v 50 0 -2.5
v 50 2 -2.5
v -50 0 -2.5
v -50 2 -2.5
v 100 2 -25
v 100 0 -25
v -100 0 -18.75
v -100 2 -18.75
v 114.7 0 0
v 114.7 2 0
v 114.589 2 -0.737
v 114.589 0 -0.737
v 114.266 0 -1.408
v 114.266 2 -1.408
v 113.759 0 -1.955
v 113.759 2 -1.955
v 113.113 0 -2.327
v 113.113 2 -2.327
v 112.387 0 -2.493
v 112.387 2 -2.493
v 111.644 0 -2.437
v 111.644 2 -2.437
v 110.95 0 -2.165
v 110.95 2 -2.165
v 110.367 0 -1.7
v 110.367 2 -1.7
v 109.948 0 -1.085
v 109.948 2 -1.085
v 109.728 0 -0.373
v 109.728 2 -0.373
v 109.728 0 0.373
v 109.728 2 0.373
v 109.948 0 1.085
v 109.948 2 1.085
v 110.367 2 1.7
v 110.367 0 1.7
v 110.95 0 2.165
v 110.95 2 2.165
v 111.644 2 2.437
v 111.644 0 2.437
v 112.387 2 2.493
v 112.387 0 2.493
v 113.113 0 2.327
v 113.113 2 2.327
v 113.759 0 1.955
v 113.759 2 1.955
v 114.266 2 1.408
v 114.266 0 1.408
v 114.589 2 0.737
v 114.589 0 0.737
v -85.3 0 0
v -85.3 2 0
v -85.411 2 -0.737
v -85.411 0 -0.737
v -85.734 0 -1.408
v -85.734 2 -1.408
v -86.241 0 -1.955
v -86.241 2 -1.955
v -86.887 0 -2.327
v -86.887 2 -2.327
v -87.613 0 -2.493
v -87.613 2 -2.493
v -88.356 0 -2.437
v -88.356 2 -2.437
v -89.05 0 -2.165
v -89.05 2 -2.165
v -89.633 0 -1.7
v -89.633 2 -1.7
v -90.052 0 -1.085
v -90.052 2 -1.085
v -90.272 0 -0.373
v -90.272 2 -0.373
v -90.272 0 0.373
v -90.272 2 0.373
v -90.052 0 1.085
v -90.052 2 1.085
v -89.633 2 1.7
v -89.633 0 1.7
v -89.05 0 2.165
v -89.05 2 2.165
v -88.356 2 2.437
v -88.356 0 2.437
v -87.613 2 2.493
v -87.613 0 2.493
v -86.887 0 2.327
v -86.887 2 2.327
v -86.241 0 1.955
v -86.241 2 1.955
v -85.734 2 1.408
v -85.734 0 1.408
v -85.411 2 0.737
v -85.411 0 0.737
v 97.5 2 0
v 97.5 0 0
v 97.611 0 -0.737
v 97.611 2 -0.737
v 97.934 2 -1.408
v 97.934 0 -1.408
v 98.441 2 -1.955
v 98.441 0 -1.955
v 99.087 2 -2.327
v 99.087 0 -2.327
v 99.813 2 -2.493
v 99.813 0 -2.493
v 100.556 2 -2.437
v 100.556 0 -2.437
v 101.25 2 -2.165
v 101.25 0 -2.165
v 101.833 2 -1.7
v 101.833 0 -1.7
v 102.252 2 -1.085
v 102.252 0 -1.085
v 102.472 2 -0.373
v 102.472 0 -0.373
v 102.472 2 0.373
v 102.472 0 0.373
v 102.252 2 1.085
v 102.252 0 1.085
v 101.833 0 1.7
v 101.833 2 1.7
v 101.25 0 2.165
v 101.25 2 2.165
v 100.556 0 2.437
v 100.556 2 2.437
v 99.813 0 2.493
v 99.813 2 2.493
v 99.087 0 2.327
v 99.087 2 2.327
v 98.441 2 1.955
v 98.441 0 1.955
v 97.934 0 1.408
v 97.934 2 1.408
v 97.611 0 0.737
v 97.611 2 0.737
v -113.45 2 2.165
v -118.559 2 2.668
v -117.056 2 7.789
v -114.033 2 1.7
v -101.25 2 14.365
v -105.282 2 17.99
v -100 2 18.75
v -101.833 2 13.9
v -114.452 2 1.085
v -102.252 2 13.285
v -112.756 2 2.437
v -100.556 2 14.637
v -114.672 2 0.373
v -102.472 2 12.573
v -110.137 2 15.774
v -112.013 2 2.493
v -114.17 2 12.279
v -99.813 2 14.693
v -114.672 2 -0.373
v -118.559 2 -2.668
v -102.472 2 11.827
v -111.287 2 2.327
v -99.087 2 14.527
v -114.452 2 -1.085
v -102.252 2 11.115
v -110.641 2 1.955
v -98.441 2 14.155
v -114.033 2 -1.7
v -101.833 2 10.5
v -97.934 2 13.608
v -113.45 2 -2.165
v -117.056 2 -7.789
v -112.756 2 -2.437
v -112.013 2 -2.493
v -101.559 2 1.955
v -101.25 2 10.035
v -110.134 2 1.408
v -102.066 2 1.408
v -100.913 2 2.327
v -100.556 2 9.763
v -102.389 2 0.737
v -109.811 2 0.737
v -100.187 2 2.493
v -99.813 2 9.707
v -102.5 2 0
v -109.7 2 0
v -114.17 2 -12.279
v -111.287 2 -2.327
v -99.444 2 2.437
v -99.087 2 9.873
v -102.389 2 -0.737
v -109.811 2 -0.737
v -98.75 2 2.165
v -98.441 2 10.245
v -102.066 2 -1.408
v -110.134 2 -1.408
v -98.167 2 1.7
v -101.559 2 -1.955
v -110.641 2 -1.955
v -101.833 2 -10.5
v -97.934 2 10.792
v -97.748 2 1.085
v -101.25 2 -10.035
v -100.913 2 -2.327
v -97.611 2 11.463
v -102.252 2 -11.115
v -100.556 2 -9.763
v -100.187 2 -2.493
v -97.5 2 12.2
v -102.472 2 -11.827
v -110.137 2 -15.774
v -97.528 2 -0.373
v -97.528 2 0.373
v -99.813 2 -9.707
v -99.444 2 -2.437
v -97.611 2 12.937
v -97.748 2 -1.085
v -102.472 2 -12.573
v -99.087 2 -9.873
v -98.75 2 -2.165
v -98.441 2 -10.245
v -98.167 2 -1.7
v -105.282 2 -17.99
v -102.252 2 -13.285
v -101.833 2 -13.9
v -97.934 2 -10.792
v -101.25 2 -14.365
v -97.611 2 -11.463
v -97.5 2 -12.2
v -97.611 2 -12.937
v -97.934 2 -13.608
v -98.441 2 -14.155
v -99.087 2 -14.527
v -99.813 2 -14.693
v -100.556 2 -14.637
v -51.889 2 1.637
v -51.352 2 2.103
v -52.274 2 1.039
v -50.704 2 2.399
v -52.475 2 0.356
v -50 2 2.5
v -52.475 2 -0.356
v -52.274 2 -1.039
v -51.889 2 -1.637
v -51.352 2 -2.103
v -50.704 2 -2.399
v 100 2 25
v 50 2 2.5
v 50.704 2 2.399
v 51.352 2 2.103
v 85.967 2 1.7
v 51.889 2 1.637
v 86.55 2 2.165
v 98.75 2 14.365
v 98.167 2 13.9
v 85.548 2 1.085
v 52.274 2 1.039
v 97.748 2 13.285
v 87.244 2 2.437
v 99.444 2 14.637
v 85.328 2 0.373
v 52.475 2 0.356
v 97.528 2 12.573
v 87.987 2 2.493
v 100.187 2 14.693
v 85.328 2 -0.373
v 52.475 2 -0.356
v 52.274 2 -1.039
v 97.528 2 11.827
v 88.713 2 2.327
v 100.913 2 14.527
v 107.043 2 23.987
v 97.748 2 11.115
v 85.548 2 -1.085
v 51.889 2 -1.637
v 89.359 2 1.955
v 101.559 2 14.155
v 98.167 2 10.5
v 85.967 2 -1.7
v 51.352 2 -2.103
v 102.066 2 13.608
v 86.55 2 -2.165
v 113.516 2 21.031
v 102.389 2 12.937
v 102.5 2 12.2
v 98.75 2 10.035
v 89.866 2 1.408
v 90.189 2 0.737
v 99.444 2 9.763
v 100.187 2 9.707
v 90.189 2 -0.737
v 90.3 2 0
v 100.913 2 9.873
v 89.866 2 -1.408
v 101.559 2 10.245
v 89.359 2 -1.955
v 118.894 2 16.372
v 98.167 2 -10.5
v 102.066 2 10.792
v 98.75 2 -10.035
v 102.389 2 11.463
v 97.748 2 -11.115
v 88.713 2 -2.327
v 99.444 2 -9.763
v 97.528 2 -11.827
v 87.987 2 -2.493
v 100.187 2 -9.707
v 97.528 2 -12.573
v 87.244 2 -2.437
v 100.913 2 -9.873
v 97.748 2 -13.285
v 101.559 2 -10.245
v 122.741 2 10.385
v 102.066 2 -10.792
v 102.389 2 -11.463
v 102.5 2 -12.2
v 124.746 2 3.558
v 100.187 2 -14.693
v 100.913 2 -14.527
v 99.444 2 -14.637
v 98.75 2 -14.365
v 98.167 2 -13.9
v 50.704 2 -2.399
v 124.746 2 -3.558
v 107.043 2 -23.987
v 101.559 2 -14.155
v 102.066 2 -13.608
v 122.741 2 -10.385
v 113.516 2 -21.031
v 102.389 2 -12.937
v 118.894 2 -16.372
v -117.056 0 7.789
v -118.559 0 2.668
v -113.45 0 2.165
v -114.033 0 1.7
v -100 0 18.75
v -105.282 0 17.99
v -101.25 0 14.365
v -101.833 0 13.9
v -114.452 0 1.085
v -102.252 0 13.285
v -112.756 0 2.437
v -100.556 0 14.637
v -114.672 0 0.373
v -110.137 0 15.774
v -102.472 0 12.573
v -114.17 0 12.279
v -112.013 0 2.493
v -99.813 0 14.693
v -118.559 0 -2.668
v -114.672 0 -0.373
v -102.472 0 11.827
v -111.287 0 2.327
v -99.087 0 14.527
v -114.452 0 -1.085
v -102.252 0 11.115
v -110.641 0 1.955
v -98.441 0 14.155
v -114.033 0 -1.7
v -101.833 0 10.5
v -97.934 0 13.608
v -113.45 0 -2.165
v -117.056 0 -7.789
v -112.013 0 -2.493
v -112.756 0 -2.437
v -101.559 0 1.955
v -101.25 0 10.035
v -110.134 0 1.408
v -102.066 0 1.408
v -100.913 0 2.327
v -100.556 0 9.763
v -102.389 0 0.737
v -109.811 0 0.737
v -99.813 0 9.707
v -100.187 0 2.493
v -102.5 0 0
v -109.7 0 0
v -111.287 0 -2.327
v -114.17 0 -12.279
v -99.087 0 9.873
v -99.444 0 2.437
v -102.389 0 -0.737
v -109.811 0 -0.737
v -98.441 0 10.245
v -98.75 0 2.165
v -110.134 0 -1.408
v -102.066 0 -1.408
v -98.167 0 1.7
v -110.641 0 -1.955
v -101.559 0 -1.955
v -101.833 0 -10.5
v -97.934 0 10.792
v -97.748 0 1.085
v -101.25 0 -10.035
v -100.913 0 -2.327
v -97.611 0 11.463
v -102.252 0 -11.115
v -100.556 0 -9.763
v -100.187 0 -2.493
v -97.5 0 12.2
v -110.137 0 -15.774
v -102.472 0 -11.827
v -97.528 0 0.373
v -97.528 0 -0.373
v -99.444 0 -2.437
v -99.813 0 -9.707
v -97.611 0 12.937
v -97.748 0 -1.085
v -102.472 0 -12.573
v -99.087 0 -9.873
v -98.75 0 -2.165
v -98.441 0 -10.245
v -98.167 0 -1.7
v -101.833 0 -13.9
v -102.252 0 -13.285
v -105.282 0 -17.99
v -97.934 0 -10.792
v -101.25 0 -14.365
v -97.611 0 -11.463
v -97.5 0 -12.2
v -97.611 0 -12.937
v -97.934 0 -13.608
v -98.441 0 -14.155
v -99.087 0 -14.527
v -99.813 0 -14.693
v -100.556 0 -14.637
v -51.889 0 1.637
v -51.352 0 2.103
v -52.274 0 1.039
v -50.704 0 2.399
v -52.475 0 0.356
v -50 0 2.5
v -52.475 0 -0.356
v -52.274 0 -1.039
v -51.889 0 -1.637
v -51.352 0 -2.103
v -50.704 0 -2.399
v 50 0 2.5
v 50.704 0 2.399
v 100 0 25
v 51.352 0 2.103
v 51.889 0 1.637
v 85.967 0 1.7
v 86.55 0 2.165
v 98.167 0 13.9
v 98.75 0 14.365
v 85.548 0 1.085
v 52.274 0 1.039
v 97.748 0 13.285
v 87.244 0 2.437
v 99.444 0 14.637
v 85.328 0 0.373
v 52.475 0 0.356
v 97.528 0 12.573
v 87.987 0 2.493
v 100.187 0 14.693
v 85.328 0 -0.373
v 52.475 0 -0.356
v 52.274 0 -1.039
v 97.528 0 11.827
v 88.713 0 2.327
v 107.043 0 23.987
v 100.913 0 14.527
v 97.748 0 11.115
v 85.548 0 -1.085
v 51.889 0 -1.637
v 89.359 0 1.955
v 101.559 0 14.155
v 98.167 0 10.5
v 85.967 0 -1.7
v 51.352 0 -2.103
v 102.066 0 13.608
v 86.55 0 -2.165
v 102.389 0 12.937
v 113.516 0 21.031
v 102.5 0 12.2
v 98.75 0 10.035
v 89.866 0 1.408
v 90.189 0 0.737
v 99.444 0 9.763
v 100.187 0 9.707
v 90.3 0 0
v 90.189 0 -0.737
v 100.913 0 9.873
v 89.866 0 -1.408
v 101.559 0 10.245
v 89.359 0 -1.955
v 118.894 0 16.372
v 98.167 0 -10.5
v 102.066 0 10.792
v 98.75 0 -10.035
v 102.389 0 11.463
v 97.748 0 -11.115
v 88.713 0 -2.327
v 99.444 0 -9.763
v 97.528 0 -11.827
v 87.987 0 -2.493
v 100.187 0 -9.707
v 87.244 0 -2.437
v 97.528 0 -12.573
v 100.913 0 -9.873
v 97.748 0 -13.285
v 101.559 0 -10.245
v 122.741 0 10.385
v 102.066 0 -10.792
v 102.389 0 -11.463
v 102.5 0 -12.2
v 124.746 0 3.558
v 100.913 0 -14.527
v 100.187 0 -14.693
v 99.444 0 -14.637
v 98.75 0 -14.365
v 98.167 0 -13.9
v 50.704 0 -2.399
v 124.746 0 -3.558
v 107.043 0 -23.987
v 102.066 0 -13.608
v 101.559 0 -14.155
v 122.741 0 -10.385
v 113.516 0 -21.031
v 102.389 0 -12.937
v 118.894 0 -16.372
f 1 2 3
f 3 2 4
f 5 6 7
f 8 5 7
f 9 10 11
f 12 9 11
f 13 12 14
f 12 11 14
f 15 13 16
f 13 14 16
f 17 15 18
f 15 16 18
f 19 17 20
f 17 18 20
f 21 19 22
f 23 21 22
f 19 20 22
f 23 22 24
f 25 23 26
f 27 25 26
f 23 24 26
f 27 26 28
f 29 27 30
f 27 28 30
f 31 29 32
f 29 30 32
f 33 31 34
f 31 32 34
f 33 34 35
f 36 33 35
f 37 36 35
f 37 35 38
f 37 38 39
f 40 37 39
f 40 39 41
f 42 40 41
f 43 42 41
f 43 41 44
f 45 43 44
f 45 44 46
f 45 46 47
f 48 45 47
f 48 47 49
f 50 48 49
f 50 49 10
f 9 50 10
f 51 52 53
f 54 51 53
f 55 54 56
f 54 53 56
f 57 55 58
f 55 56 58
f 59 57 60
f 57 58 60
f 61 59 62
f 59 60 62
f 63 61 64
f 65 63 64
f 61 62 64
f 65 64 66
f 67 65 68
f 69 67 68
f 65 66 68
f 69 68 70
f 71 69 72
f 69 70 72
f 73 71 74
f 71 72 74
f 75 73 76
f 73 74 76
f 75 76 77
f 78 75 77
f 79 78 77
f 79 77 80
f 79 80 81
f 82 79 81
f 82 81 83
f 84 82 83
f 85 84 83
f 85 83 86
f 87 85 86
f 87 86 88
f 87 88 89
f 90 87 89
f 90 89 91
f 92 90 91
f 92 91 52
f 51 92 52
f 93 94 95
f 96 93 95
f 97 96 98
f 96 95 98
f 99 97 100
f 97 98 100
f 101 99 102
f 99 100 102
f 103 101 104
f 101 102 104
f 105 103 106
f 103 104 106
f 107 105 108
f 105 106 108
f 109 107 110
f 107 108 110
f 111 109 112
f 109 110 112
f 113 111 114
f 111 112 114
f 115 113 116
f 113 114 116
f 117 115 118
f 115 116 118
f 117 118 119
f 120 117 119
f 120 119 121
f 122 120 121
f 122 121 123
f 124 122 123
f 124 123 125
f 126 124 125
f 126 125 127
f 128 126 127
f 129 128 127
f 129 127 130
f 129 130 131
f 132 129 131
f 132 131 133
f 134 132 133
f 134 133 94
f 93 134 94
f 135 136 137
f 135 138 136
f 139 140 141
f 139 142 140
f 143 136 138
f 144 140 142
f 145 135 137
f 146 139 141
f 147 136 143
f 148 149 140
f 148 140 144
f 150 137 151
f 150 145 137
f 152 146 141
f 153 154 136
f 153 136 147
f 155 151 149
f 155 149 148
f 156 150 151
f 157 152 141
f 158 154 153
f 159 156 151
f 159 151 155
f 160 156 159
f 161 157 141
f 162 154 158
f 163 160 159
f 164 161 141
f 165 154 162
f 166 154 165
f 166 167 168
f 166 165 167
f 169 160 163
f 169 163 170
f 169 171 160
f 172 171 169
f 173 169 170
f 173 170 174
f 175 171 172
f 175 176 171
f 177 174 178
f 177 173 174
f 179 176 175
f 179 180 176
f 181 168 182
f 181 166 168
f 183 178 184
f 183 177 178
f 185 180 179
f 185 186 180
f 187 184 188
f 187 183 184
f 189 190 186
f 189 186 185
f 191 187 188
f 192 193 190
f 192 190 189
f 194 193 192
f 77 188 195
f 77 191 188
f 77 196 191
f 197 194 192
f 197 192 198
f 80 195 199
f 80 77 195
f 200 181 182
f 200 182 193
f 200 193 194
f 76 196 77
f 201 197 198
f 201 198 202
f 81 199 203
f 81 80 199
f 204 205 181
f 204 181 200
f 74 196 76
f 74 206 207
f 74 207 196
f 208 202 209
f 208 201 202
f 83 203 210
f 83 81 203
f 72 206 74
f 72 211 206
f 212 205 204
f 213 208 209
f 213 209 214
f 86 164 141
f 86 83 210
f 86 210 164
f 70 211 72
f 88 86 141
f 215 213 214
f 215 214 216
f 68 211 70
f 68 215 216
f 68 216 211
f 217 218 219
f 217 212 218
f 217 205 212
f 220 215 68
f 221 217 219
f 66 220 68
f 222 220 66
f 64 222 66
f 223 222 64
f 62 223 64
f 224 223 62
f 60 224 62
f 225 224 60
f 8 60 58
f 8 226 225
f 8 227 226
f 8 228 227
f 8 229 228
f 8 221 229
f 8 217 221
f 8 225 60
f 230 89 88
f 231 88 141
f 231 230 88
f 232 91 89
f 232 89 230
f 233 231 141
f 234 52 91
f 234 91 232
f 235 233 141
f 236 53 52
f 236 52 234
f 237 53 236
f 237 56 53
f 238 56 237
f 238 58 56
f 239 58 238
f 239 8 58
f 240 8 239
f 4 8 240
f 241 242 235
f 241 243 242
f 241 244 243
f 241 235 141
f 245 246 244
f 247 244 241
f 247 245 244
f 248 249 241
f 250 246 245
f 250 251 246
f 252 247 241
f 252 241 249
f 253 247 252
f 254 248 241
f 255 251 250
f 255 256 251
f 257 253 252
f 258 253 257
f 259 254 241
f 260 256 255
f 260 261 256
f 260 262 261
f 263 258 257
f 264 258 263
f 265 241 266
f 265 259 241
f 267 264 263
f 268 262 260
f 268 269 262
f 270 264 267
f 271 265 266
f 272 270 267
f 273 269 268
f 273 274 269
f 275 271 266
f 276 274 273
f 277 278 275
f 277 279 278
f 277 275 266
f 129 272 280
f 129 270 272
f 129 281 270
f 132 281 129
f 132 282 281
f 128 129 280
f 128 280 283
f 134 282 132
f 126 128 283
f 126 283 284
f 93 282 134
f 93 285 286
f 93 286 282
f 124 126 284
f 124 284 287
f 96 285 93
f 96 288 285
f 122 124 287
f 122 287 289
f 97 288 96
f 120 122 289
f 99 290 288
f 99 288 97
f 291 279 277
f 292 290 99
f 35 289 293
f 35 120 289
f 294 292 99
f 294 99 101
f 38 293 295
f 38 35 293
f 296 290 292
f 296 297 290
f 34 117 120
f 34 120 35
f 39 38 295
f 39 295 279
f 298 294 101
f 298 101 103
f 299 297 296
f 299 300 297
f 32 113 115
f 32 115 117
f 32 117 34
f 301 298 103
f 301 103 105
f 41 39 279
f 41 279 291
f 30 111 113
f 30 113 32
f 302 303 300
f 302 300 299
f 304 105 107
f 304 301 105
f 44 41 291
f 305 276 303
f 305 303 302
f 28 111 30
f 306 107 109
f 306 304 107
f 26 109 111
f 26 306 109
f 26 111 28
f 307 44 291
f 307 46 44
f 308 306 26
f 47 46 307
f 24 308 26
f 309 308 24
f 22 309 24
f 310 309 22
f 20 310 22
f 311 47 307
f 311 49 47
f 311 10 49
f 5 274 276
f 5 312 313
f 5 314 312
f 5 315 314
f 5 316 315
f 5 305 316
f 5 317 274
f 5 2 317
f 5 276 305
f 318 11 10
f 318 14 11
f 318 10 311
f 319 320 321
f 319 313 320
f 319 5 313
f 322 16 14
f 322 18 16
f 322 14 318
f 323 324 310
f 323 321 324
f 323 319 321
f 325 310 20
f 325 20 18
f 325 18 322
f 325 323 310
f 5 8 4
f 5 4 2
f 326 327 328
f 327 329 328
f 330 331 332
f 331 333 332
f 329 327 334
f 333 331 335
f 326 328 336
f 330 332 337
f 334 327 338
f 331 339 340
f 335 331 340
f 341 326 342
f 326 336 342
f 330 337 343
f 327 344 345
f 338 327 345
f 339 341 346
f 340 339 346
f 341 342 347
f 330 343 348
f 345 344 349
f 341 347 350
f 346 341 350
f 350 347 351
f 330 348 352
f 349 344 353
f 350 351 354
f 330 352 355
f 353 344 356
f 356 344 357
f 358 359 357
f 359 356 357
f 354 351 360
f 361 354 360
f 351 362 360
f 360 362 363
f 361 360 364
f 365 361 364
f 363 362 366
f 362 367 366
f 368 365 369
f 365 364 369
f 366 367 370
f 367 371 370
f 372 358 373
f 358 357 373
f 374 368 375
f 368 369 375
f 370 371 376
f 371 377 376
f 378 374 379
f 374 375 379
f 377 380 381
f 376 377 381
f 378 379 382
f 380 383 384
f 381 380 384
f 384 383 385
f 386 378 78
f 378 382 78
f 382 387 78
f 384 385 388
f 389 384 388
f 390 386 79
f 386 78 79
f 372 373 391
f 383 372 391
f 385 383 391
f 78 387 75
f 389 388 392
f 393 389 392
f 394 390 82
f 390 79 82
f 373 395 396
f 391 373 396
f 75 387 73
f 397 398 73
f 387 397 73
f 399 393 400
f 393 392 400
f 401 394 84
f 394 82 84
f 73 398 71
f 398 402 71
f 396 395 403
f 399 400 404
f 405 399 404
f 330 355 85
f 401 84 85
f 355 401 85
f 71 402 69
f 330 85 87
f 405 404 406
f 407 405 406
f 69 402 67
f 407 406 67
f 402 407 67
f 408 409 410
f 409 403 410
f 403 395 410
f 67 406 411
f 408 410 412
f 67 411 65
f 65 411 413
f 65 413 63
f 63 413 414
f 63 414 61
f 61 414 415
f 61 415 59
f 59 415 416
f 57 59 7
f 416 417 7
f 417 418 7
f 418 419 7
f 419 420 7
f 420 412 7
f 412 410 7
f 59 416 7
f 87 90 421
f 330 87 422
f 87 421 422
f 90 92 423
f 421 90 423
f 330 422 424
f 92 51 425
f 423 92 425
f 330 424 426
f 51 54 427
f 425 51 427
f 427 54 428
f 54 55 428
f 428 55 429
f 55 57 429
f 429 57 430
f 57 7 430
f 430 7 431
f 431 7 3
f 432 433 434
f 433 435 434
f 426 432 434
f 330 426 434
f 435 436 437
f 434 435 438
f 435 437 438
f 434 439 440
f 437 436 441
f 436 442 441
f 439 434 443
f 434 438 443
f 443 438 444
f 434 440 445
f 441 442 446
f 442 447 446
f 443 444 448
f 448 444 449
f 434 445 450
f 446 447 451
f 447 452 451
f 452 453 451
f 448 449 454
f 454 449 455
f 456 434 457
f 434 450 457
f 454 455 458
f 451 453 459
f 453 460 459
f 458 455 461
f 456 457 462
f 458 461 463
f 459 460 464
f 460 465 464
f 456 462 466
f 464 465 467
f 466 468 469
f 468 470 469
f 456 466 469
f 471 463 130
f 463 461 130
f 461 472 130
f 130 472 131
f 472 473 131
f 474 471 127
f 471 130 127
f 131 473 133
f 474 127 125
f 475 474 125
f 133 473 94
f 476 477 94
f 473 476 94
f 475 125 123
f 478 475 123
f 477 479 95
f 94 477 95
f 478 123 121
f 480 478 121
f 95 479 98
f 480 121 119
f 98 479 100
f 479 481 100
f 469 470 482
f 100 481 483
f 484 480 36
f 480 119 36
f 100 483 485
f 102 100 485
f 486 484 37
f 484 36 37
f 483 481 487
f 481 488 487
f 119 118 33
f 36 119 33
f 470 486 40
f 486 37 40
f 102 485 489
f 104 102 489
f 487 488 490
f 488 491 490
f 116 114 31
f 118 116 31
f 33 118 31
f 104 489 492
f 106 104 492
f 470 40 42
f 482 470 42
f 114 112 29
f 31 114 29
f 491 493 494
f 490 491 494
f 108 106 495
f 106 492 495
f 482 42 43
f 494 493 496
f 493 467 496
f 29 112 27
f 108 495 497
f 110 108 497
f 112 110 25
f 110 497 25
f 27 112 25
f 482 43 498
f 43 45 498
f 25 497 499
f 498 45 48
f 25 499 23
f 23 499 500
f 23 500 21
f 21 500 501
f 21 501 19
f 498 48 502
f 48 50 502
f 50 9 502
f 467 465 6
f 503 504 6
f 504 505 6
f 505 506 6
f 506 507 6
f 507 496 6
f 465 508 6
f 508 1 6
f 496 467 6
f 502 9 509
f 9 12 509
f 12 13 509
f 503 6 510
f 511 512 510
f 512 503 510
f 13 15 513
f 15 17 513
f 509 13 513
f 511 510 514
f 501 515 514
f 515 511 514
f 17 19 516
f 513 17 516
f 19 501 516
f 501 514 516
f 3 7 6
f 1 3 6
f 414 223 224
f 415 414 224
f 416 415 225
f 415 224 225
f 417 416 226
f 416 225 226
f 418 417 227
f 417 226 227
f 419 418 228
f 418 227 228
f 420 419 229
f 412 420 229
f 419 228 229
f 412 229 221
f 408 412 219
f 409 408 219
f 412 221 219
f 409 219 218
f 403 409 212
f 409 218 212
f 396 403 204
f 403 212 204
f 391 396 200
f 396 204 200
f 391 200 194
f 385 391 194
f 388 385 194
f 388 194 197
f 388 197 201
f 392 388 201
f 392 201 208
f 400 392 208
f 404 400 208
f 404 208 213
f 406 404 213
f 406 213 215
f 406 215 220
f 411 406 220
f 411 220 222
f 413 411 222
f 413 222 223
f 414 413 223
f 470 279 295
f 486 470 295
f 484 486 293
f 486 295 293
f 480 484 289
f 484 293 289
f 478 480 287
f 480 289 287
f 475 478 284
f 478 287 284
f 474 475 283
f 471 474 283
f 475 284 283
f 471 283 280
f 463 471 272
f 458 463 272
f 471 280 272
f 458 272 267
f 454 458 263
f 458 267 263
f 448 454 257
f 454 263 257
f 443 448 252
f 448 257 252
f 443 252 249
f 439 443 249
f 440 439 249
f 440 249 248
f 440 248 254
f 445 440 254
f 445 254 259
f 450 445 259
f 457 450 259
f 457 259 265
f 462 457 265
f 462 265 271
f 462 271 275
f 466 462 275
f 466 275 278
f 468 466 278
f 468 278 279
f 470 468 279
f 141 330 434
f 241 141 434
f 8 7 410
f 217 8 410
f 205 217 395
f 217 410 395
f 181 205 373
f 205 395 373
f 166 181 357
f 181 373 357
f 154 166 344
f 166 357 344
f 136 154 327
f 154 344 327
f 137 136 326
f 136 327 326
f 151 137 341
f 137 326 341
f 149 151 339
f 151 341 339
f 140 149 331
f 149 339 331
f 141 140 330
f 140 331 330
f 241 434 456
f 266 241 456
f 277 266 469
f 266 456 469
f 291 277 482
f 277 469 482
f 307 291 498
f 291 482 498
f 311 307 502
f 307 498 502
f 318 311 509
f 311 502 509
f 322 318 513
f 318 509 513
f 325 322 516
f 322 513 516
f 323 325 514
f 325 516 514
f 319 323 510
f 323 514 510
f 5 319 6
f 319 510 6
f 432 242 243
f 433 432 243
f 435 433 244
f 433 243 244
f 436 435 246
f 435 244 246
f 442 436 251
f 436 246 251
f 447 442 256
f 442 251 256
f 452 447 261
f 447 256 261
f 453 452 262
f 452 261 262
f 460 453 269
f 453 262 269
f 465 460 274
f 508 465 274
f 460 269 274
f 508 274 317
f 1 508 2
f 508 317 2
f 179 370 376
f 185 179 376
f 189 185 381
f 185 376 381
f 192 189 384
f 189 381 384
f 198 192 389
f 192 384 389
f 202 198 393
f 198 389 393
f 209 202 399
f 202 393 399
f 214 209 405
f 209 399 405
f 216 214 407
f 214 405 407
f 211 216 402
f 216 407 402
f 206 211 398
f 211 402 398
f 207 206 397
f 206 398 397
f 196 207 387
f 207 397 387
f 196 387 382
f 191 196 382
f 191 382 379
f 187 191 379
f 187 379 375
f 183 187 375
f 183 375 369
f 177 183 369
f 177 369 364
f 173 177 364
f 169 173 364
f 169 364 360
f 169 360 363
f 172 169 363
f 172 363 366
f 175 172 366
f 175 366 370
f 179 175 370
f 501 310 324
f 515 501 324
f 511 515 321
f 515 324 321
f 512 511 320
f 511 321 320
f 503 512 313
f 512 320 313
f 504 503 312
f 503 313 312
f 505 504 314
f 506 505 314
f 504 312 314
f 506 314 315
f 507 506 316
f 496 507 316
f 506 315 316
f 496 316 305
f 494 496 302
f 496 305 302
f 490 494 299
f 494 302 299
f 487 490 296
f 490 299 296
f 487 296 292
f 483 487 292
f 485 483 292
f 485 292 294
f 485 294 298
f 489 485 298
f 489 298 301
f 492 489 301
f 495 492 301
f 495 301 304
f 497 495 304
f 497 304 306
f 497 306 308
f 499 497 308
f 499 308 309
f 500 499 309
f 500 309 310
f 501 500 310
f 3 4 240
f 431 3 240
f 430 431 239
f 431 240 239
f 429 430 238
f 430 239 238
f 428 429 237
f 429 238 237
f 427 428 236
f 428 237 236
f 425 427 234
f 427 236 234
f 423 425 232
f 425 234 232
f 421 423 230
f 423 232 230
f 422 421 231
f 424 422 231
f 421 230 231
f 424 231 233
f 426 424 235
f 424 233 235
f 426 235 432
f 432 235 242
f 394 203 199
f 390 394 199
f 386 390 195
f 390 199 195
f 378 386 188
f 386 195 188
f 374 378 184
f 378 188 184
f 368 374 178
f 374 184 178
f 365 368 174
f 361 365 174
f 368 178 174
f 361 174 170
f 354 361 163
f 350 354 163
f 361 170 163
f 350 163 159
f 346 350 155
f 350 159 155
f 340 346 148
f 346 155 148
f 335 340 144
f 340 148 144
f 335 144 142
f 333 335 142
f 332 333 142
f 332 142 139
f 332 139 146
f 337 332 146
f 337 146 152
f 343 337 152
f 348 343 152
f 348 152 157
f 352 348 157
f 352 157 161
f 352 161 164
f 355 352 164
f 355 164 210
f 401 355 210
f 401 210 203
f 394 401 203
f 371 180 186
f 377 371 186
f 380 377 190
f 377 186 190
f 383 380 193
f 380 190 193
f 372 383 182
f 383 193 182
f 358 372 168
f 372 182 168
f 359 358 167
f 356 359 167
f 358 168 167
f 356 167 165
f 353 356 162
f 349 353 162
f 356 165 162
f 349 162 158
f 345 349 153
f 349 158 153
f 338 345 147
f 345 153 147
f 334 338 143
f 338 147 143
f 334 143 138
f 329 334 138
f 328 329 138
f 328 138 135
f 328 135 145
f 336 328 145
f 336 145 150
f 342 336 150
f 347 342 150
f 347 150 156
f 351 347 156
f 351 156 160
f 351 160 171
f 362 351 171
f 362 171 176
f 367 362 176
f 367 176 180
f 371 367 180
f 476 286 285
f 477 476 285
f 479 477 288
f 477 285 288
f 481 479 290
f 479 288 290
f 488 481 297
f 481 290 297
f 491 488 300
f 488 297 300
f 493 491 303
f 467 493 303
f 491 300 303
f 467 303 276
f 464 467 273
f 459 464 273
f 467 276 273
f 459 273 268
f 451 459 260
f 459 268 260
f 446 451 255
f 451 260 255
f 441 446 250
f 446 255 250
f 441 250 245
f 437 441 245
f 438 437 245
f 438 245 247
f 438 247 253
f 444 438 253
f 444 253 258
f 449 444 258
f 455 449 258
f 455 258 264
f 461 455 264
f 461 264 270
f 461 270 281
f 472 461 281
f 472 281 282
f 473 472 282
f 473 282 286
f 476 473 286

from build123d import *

# Parameters (mm, degrees)
BOSS_EXTRUDE1_DEPTH       = 2
F_5_0MM_DOWEL_HOLE1_D     = 5
F_5_0MM_DOWEL_HOLE1_DEPTH = 2
CUT_EXTRUDE1_REACH        = 4
SKETCH4_R                 = 2.5
CUT_EXTRUDE2_REACH        = 4


with BuildPart() as part:
    # Sketch2 → Boss-Extrude1 (new body)
    with BuildSketch(Plane(origin=(0, 0, 0), x_dir=(1, 0, 0), z_dir=(0, 1, 0))):
        with BuildLine():
            Line((100, 25), (-100, 18.75))
            ThreePointArc((-100, 18.75), (-118.75, 0), (-100, -18.75))
            Line((-100, -18.75), (100, -25))
            ThreePointArc((100, -25), (125, 0), (100, 25))
        make_face()
    extrude(amount=BOSS_EXTRUDE1_DEPTH)

    # Ø5.0mm Dowel Hole1
    with Locations(Plane(origin=(0, 2, 0), x_dir=(1, 0, 0), z_dir=(0, 1, 0))):
        with Locations((100, 0), (-100, 0)):
            Hole(F_5_0MM_DOWEL_HOLE1_D / 2, depth=F_5_0MM_DOWEL_HOLE1_DEPTH)

    # Sketch4 → Cut-Extrude1 (cut, up to next)
    with BuildSketch(Plane(origin=(0, 2, 0), x_dir=(1, 0, 0), z_dir=(0, 1, 0)), mode=Mode.PRIVATE) as cut_extrude1_sk1:
        with Locations((100, 12.2)):
            Circle(SKETCH4_R)
    cut_extrude1_tool1 = extrude(cut_extrude1_sk1.sketch, amount=-CUT_EXTRUDE1_REACH, mode=Mode.PRIVATE) & part.part
    add(cut_extrude1_tool1.solids().sort_by_distance((100, 2, -12.2))[0], mode=Mode.SUBTRACT)
    # Sketch4 → Cut-Extrude1 (cut, up to next)
    with BuildSketch(Plane(origin=(0, 2, 0), x_dir=(1, 0, 0), z_dir=(0, 1, 0)), mode=Mode.PRIVATE) as cut_extrude1_sk2:
        with Locations((100, -12.2)):
            Circle(SKETCH4_R)
    cut_extrude1_tool2 = extrude(cut_extrude1_sk2.sketch, amount=-CUT_EXTRUDE1_REACH, mode=Mode.PRIVATE) & part.part
    add(cut_extrude1_tool2.solids().sort_by_distance((100, 2, 12.2))[0], mode=Mode.SUBTRACT)
    # Sketch4 → Cut-Extrude1 (cut, up to next)
    with BuildSketch(Plane(origin=(0, 2, 0), x_dir=(1, 0, 0), z_dir=(0, 1, 0)), mode=Mode.PRIVATE) as cut_extrude1_sk3:
        with Locations((112.2, 0)):
            Circle(SKETCH4_R)
    cut_extrude1_tool3 = extrude(cut_extrude1_sk3.sketch, amount=-CUT_EXTRUDE1_REACH, mode=Mode.PRIVATE) & part.part
    add(cut_extrude1_tool3.solids().sort_by_distance((112.2, 2, 0))[0], mode=Mode.SUBTRACT)
    # Sketch4 → Cut-Extrude1 (cut, up to next)
    with BuildSketch(Plane(origin=(0, 2, 0), x_dir=(1, 0, 0), z_dir=(0, 1, 0)), mode=Mode.PRIVATE) as cut_extrude1_sk4:
        with Locations((87.8, 0)):
            Circle(SKETCH4_R)
    cut_extrude1_tool4 = extrude(cut_extrude1_sk4.sketch, amount=-CUT_EXTRUDE1_REACH, mode=Mode.PRIVATE) & part.part
    add(cut_extrude1_tool4.solids().sort_by_distance((87.8, 2, 0))[0], mode=Mode.SUBTRACT)
    # Sketch4 → Cut-Extrude1 (cut, up to next)
    with BuildSketch(Plane(origin=(0, 2, 0), x_dir=(1, 0, 0), z_dir=(0, 1, 0)), mode=Mode.PRIVATE) as cut_extrude1_sk5:
        with Locations((-100, 12.2)):
            Circle(SKETCH4_R)
    cut_extrude1_tool5 = extrude(cut_extrude1_sk5.sketch, amount=-CUT_EXTRUDE1_REACH, mode=Mode.PRIVATE) & part.part
    add(cut_extrude1_tool5.solids().sort_by_distance((-100, 2, -12.2))[0], mode=Mode.SUBTRACT)
    # Sketch4 → Cut-Extrude1 (cut, up to next)
    with BuildSketch(Plane(origin=(0, 2, 0), x_dir=(1, 0, 0), z_dir=(0, 1, 0)), mode=Mode.PRIVATE) as cut_extrude1_sk6:
        with Locations((-87.8, 0)):
            Circle(SKETCH4_R)
    cut_extrude1_tool6 = extrude(cut_extrude1_sk6.sketch, amount=-CUT_EXTRUDE1_REACH, mode=Mode.PRIVATE) & part.part
    add(cut_extrude1_tool6.solids().sort_by_distance((-87.8, 2, 0))[0], mode=Mode.SUBTRACT)
    # Sketch4 → Cut-Extrude1 (cut, up to next)
    with BuildSketch(Plane(origin=(0, 2, 0), x_dir=(1, 0, 0), z_dir=(0, 1, 0)), mode=Mode.PRIVATE) as cut_extrude1_sk7:
        with Locations((-112.2, 0)):
            Circle(SKETCH4_R)
    cut_extrude1_tool7 = extrude(cut_extrude1_sk7.sketch, amount=-CUT_EXTRUDE1_REACH, mode=Mode.PRIVATE) & part.part
    add(cut_extrude1_tool7.solids().sort_by_distance((-112.2, 2, 0))[0], mode=Mode.SUBTRACT)
    # Sketch4 → Cut-Extrude1 (cut, up to next)
    with BuildSketch(Plane(origin=(0, 2, 0), x_dir=(1, 0, 0), z_dir=(0, 1, 0)), mode=Mode.PRIVATE) as cut_extrude1_sk8:
        with Locations((-100, -12.2)):
            Circle(SKETCH4_R)
    cut_extrude1_tool8 = extrude(cut_extrude1_sk8.sketch, amount=-CUT_EXTRUDE1_REACH, mode=Mode.PRIVATE) & part.part
    add(cut_extrude1_tool8.solids().sort_by_distance((-100, 2, 12.2))[0], mode=Mode.SUBTRACT)

    # Sketch16 → Cut-Extrude2 (cut, up to next)
    with BuildSketch(Plane(origin=(0, 2, 0), x_dir=(1, 0, 0), z_dir=(0, 1, 0)), mode=Mode.PRIVATE) as cut_extrude2_sk1:
        with BuildLine():
            Line((-50, -2.5), (50, -2.5))
            ThreePointArc((50, -2.5), (52.5, 0), (50, 2.5))
            Line((50, 2.5), (-50, 2.5))
            ThreePointArc((-50, 2.5), (-52.5, 0), (-50, -2.5))
        make_face()
    cut_extrude2_tool1 = extrude(cut_extrude2_sk1.sketch, amount=-CUT_EXTRUDE2_REACH, mode=Mode.PRIVATE) & part.part
    add(cut_extrude2_tool1.solids().sort_by_distance((0, 2, 0))[0], mode=Mode.SUBTRACT)


solid = part.part
